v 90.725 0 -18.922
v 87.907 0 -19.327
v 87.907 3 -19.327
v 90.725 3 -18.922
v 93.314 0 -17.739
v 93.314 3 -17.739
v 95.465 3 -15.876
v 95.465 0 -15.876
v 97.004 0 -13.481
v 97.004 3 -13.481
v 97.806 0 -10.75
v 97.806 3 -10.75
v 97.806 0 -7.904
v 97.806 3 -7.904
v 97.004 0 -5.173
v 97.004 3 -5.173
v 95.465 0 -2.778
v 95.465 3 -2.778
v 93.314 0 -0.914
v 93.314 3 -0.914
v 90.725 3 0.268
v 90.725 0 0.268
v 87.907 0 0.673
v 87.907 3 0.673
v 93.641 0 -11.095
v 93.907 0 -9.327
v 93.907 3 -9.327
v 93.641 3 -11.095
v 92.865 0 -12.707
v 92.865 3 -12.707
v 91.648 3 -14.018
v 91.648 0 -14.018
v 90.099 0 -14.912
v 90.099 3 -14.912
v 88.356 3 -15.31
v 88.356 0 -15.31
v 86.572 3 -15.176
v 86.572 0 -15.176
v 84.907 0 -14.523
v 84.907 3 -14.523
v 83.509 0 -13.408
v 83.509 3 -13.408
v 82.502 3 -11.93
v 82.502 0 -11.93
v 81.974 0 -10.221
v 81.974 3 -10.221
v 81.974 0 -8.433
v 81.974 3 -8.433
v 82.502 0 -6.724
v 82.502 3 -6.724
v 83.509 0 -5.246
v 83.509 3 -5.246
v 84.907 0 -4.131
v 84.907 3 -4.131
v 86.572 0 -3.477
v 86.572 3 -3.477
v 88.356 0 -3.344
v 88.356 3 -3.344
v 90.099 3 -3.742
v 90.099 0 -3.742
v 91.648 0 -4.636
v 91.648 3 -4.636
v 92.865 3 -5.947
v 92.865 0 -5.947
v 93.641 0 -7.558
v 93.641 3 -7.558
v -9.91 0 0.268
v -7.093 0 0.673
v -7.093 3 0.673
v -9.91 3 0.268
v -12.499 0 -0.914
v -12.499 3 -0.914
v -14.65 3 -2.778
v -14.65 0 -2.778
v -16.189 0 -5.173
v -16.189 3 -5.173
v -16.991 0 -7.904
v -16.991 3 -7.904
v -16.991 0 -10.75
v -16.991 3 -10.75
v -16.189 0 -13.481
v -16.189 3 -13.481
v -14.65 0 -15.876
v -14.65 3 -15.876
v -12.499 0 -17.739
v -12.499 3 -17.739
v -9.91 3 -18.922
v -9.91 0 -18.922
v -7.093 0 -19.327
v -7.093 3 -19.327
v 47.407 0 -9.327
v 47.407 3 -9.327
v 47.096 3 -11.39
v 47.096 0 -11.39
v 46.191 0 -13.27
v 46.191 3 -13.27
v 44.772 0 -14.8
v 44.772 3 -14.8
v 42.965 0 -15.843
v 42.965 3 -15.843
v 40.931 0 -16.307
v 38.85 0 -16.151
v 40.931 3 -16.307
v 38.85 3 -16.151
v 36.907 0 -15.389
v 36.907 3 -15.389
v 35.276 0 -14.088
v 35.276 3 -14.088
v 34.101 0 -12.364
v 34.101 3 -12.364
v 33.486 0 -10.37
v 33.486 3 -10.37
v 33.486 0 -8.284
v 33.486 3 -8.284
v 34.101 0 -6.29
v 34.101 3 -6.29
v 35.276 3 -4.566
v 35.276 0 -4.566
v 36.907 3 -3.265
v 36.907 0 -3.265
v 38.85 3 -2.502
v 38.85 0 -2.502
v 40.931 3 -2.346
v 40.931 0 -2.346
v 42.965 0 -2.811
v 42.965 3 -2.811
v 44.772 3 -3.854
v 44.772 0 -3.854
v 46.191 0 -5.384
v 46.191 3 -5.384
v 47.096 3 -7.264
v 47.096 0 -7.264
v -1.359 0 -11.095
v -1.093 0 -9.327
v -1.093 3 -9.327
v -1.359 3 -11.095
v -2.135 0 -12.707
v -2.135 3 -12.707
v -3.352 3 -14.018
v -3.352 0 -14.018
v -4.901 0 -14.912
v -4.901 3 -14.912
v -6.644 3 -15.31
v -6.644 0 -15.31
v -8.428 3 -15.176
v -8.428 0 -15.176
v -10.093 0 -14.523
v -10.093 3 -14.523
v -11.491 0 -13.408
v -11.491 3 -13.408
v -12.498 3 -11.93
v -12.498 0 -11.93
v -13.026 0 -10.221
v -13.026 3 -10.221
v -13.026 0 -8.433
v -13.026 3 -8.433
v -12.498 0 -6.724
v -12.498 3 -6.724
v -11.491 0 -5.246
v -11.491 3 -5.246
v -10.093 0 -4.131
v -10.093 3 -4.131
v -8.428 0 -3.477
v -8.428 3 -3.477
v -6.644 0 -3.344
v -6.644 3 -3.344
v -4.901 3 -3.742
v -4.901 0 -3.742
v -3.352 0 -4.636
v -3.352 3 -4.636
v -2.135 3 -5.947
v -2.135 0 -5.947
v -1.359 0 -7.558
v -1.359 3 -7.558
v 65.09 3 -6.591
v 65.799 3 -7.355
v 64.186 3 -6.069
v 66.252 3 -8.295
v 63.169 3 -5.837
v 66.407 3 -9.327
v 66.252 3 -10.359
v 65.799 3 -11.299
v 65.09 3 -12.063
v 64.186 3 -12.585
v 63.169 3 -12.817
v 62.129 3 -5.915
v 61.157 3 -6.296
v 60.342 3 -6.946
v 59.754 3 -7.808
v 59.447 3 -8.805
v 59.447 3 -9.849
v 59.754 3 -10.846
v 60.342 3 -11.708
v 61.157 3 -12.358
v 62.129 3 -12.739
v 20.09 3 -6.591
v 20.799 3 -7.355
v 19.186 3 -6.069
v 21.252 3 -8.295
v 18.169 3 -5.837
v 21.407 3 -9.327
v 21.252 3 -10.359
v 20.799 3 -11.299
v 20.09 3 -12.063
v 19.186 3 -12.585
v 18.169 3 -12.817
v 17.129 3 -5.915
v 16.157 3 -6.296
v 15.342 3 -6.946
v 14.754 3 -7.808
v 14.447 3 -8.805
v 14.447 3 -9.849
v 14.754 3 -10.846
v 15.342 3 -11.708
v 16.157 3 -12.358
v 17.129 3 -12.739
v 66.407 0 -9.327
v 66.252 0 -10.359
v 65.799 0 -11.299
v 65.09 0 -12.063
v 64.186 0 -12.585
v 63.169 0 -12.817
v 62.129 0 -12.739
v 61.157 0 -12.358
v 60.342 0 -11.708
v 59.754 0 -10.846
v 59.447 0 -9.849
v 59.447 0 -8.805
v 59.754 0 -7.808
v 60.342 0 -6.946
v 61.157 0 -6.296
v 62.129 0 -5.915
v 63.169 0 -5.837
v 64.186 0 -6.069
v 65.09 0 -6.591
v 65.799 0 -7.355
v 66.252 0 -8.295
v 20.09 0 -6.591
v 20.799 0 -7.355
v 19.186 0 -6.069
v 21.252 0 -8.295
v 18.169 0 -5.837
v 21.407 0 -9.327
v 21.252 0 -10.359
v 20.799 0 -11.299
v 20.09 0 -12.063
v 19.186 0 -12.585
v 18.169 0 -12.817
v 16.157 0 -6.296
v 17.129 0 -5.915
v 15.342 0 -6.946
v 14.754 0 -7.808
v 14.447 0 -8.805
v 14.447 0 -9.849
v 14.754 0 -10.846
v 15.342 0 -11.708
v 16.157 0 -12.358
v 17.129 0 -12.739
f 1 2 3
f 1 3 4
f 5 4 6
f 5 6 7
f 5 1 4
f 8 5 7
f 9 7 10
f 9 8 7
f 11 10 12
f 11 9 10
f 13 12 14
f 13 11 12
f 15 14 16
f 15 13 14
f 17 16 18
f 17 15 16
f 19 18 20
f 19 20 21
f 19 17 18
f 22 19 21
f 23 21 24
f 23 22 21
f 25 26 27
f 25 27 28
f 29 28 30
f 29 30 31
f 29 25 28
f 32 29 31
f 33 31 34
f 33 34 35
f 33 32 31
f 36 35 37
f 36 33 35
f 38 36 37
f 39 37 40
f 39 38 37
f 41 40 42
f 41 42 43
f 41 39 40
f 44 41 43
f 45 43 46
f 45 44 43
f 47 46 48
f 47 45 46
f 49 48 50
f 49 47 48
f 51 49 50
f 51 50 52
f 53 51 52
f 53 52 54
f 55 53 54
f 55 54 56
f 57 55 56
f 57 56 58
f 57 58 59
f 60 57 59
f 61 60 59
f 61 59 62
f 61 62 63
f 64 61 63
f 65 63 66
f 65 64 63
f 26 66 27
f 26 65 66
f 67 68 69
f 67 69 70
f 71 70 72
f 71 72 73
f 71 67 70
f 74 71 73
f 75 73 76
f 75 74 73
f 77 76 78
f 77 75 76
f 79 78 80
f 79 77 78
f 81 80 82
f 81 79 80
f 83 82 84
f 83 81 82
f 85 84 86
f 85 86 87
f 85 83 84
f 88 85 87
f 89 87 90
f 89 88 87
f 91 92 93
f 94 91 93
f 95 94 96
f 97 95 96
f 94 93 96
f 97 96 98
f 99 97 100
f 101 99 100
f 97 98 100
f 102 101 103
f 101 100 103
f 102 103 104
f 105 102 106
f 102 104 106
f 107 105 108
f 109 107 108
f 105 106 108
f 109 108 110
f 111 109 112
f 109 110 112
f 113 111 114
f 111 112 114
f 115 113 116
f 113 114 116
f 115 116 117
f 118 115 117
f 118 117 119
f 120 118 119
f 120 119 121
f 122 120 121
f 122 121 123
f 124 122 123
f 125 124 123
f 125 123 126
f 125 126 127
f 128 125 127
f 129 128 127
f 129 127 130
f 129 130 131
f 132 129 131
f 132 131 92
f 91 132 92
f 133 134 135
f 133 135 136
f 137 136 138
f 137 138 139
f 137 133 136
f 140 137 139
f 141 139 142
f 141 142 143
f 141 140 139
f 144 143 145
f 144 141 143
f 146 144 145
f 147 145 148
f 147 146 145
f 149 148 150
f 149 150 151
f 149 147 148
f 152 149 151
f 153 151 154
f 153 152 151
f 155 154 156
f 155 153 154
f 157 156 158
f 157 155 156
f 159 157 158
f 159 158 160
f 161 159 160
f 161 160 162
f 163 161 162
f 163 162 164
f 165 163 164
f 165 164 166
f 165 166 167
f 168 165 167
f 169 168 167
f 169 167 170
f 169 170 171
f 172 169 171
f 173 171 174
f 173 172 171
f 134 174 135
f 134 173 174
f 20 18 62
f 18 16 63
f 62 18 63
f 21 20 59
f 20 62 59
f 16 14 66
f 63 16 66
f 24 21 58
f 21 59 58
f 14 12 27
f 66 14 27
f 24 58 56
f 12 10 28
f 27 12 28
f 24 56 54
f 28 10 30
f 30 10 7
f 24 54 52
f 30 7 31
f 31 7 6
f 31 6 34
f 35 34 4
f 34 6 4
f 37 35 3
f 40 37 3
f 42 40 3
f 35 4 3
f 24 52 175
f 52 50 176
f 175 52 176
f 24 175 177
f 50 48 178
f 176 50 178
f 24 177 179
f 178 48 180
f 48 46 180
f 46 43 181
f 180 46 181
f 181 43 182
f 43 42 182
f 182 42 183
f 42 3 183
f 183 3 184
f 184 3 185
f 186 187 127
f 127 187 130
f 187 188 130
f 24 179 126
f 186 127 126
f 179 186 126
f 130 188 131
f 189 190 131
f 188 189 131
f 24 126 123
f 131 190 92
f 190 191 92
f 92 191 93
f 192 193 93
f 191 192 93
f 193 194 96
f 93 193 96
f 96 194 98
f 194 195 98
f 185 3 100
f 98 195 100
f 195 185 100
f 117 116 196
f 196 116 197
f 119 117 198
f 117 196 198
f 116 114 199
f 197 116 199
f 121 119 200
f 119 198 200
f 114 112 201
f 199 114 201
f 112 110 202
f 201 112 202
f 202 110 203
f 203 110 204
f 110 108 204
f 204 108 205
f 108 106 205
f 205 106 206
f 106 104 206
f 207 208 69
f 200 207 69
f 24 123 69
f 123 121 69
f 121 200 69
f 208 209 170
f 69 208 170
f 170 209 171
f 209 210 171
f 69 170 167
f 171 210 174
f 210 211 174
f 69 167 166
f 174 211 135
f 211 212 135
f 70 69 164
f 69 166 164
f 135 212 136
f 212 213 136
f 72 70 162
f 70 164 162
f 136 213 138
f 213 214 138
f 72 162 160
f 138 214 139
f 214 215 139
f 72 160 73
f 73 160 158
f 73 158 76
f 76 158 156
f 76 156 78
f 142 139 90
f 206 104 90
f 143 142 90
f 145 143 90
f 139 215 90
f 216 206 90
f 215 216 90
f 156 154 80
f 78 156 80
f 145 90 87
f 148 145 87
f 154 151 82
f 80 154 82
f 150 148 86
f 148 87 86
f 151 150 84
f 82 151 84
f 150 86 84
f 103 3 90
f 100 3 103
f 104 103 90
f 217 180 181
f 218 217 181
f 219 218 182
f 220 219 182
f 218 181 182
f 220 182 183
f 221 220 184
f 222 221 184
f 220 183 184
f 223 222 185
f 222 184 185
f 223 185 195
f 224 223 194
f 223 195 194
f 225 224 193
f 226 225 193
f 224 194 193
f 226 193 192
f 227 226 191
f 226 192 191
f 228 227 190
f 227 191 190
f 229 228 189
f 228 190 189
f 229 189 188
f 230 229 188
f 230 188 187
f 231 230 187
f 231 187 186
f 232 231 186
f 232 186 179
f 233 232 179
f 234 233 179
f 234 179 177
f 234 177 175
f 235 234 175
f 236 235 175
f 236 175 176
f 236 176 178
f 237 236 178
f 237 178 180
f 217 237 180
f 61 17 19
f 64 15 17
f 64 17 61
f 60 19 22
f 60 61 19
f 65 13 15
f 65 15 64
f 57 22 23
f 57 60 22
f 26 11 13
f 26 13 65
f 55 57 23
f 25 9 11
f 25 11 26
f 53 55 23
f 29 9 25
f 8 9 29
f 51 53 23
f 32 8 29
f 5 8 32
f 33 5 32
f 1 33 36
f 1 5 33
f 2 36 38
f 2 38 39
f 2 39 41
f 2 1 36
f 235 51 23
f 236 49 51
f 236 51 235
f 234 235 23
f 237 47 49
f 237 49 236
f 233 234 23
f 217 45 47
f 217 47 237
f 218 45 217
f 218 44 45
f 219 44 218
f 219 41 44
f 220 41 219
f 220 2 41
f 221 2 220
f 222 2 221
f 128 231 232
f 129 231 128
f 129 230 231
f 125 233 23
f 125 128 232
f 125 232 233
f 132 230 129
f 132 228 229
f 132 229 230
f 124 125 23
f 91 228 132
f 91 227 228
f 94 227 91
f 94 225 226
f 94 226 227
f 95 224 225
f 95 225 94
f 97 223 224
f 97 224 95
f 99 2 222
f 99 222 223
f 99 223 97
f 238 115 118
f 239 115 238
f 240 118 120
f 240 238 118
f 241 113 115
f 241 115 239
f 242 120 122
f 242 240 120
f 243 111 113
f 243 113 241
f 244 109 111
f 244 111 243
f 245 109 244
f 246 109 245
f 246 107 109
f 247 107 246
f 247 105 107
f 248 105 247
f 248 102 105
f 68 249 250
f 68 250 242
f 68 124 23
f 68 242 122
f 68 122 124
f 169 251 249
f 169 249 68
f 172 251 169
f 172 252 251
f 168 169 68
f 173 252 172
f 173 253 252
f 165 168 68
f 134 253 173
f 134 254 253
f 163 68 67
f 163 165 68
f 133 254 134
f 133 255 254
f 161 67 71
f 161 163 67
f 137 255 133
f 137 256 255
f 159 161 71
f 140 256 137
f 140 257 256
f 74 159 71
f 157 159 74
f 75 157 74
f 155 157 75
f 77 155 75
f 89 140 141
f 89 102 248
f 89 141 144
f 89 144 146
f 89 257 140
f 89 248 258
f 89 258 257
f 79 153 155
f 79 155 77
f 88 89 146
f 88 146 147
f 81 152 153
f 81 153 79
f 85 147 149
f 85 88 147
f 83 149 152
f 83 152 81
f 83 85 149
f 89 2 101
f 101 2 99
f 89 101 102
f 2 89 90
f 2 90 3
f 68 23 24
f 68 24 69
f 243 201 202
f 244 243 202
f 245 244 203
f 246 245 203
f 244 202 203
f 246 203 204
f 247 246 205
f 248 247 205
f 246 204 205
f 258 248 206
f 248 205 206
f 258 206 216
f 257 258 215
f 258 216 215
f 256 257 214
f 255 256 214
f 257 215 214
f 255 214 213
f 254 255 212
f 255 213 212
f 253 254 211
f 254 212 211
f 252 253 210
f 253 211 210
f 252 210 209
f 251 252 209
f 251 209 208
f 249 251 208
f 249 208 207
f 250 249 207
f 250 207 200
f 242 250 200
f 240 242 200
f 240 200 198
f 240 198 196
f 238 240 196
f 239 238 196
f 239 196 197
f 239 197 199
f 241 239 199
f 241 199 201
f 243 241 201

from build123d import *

# Parameters (mm, degrees)
SKETCH1_R           = 6
BOSS_EXTRUDE1_DEPTH = 3
SKETCH2_R           = 7
CUT_EXTRUDE1_DEPTH  = 4
SKETCH3_R           = 3.5
CUT_EXTRUDE2_DEPTH  = 4


with BuildPart() as part:
    # Sketch1 → Boss-Extrude1 (new body)
    with BuildSketch(Plane(origin=(0, 0, 0), x_dir=(1, 0, 0), z_dir=(0, 1, 0))):
        with BuildLine():
            Line((-7.092556659, 19.326923077), (87.907443341, 19.326923077))
            ThreePointArc((87.907443341, 19.326923077), (97.907443341, 9.326923077), (87.907443341, -0.673076923))
            Line((87.907443341, -0.673076923), (-7.092556659, -0.673076923))
            ThreePointArc((-7.092556659, -0.673076923), (-17.092556659, 9.326923077), (-7.092556659, 19.326923077))
        make_face()
        with Locations((-7.092556659, 9.326923077)):
            Circle(SKETCH1_R, mode=Mode.SUBTRACT)
        with Locations((87.907443341, 9.326923077)):
            Circle(SKETCH1_R, mode=Mode.SUBTRACT)
    extrude(amount=BOSS_EXTRUDE1_DEPTH)

    # Sketch2 → Cut-Extrude1 (cut, through all)
    with BuildSketch(Plane(origin=(0, 3, 0), x_dir=(1, 0, 0), z_dir=(0, 1, 0))):
        with Locations((40.407443341, 9.326923077)):
            Circle(SKETCH2_R)
    extrude(amount=-CUT_EXTRUDE1_DEPTH, mode=Mode.SUBTRACT)

    # Sketch3 → Cut-Extrude2 (cut, through all)
    with BuildSketch(Plane(origin=(0, 3, 0), x_dir=(1, 0, 0), z_dir=(0, 1, 0))):
        with Locations((17.907443341, 9.326923077)):
            Circle(SKETCH3_R)
        with Locations((62.907443341, 9.326923077)):
            Circle(SKETCH3_R)
    extrude(amount=-CUT_EXTRUDE2_DEPTH, mode=Mode.SUBTRACT)


solid = part.part
